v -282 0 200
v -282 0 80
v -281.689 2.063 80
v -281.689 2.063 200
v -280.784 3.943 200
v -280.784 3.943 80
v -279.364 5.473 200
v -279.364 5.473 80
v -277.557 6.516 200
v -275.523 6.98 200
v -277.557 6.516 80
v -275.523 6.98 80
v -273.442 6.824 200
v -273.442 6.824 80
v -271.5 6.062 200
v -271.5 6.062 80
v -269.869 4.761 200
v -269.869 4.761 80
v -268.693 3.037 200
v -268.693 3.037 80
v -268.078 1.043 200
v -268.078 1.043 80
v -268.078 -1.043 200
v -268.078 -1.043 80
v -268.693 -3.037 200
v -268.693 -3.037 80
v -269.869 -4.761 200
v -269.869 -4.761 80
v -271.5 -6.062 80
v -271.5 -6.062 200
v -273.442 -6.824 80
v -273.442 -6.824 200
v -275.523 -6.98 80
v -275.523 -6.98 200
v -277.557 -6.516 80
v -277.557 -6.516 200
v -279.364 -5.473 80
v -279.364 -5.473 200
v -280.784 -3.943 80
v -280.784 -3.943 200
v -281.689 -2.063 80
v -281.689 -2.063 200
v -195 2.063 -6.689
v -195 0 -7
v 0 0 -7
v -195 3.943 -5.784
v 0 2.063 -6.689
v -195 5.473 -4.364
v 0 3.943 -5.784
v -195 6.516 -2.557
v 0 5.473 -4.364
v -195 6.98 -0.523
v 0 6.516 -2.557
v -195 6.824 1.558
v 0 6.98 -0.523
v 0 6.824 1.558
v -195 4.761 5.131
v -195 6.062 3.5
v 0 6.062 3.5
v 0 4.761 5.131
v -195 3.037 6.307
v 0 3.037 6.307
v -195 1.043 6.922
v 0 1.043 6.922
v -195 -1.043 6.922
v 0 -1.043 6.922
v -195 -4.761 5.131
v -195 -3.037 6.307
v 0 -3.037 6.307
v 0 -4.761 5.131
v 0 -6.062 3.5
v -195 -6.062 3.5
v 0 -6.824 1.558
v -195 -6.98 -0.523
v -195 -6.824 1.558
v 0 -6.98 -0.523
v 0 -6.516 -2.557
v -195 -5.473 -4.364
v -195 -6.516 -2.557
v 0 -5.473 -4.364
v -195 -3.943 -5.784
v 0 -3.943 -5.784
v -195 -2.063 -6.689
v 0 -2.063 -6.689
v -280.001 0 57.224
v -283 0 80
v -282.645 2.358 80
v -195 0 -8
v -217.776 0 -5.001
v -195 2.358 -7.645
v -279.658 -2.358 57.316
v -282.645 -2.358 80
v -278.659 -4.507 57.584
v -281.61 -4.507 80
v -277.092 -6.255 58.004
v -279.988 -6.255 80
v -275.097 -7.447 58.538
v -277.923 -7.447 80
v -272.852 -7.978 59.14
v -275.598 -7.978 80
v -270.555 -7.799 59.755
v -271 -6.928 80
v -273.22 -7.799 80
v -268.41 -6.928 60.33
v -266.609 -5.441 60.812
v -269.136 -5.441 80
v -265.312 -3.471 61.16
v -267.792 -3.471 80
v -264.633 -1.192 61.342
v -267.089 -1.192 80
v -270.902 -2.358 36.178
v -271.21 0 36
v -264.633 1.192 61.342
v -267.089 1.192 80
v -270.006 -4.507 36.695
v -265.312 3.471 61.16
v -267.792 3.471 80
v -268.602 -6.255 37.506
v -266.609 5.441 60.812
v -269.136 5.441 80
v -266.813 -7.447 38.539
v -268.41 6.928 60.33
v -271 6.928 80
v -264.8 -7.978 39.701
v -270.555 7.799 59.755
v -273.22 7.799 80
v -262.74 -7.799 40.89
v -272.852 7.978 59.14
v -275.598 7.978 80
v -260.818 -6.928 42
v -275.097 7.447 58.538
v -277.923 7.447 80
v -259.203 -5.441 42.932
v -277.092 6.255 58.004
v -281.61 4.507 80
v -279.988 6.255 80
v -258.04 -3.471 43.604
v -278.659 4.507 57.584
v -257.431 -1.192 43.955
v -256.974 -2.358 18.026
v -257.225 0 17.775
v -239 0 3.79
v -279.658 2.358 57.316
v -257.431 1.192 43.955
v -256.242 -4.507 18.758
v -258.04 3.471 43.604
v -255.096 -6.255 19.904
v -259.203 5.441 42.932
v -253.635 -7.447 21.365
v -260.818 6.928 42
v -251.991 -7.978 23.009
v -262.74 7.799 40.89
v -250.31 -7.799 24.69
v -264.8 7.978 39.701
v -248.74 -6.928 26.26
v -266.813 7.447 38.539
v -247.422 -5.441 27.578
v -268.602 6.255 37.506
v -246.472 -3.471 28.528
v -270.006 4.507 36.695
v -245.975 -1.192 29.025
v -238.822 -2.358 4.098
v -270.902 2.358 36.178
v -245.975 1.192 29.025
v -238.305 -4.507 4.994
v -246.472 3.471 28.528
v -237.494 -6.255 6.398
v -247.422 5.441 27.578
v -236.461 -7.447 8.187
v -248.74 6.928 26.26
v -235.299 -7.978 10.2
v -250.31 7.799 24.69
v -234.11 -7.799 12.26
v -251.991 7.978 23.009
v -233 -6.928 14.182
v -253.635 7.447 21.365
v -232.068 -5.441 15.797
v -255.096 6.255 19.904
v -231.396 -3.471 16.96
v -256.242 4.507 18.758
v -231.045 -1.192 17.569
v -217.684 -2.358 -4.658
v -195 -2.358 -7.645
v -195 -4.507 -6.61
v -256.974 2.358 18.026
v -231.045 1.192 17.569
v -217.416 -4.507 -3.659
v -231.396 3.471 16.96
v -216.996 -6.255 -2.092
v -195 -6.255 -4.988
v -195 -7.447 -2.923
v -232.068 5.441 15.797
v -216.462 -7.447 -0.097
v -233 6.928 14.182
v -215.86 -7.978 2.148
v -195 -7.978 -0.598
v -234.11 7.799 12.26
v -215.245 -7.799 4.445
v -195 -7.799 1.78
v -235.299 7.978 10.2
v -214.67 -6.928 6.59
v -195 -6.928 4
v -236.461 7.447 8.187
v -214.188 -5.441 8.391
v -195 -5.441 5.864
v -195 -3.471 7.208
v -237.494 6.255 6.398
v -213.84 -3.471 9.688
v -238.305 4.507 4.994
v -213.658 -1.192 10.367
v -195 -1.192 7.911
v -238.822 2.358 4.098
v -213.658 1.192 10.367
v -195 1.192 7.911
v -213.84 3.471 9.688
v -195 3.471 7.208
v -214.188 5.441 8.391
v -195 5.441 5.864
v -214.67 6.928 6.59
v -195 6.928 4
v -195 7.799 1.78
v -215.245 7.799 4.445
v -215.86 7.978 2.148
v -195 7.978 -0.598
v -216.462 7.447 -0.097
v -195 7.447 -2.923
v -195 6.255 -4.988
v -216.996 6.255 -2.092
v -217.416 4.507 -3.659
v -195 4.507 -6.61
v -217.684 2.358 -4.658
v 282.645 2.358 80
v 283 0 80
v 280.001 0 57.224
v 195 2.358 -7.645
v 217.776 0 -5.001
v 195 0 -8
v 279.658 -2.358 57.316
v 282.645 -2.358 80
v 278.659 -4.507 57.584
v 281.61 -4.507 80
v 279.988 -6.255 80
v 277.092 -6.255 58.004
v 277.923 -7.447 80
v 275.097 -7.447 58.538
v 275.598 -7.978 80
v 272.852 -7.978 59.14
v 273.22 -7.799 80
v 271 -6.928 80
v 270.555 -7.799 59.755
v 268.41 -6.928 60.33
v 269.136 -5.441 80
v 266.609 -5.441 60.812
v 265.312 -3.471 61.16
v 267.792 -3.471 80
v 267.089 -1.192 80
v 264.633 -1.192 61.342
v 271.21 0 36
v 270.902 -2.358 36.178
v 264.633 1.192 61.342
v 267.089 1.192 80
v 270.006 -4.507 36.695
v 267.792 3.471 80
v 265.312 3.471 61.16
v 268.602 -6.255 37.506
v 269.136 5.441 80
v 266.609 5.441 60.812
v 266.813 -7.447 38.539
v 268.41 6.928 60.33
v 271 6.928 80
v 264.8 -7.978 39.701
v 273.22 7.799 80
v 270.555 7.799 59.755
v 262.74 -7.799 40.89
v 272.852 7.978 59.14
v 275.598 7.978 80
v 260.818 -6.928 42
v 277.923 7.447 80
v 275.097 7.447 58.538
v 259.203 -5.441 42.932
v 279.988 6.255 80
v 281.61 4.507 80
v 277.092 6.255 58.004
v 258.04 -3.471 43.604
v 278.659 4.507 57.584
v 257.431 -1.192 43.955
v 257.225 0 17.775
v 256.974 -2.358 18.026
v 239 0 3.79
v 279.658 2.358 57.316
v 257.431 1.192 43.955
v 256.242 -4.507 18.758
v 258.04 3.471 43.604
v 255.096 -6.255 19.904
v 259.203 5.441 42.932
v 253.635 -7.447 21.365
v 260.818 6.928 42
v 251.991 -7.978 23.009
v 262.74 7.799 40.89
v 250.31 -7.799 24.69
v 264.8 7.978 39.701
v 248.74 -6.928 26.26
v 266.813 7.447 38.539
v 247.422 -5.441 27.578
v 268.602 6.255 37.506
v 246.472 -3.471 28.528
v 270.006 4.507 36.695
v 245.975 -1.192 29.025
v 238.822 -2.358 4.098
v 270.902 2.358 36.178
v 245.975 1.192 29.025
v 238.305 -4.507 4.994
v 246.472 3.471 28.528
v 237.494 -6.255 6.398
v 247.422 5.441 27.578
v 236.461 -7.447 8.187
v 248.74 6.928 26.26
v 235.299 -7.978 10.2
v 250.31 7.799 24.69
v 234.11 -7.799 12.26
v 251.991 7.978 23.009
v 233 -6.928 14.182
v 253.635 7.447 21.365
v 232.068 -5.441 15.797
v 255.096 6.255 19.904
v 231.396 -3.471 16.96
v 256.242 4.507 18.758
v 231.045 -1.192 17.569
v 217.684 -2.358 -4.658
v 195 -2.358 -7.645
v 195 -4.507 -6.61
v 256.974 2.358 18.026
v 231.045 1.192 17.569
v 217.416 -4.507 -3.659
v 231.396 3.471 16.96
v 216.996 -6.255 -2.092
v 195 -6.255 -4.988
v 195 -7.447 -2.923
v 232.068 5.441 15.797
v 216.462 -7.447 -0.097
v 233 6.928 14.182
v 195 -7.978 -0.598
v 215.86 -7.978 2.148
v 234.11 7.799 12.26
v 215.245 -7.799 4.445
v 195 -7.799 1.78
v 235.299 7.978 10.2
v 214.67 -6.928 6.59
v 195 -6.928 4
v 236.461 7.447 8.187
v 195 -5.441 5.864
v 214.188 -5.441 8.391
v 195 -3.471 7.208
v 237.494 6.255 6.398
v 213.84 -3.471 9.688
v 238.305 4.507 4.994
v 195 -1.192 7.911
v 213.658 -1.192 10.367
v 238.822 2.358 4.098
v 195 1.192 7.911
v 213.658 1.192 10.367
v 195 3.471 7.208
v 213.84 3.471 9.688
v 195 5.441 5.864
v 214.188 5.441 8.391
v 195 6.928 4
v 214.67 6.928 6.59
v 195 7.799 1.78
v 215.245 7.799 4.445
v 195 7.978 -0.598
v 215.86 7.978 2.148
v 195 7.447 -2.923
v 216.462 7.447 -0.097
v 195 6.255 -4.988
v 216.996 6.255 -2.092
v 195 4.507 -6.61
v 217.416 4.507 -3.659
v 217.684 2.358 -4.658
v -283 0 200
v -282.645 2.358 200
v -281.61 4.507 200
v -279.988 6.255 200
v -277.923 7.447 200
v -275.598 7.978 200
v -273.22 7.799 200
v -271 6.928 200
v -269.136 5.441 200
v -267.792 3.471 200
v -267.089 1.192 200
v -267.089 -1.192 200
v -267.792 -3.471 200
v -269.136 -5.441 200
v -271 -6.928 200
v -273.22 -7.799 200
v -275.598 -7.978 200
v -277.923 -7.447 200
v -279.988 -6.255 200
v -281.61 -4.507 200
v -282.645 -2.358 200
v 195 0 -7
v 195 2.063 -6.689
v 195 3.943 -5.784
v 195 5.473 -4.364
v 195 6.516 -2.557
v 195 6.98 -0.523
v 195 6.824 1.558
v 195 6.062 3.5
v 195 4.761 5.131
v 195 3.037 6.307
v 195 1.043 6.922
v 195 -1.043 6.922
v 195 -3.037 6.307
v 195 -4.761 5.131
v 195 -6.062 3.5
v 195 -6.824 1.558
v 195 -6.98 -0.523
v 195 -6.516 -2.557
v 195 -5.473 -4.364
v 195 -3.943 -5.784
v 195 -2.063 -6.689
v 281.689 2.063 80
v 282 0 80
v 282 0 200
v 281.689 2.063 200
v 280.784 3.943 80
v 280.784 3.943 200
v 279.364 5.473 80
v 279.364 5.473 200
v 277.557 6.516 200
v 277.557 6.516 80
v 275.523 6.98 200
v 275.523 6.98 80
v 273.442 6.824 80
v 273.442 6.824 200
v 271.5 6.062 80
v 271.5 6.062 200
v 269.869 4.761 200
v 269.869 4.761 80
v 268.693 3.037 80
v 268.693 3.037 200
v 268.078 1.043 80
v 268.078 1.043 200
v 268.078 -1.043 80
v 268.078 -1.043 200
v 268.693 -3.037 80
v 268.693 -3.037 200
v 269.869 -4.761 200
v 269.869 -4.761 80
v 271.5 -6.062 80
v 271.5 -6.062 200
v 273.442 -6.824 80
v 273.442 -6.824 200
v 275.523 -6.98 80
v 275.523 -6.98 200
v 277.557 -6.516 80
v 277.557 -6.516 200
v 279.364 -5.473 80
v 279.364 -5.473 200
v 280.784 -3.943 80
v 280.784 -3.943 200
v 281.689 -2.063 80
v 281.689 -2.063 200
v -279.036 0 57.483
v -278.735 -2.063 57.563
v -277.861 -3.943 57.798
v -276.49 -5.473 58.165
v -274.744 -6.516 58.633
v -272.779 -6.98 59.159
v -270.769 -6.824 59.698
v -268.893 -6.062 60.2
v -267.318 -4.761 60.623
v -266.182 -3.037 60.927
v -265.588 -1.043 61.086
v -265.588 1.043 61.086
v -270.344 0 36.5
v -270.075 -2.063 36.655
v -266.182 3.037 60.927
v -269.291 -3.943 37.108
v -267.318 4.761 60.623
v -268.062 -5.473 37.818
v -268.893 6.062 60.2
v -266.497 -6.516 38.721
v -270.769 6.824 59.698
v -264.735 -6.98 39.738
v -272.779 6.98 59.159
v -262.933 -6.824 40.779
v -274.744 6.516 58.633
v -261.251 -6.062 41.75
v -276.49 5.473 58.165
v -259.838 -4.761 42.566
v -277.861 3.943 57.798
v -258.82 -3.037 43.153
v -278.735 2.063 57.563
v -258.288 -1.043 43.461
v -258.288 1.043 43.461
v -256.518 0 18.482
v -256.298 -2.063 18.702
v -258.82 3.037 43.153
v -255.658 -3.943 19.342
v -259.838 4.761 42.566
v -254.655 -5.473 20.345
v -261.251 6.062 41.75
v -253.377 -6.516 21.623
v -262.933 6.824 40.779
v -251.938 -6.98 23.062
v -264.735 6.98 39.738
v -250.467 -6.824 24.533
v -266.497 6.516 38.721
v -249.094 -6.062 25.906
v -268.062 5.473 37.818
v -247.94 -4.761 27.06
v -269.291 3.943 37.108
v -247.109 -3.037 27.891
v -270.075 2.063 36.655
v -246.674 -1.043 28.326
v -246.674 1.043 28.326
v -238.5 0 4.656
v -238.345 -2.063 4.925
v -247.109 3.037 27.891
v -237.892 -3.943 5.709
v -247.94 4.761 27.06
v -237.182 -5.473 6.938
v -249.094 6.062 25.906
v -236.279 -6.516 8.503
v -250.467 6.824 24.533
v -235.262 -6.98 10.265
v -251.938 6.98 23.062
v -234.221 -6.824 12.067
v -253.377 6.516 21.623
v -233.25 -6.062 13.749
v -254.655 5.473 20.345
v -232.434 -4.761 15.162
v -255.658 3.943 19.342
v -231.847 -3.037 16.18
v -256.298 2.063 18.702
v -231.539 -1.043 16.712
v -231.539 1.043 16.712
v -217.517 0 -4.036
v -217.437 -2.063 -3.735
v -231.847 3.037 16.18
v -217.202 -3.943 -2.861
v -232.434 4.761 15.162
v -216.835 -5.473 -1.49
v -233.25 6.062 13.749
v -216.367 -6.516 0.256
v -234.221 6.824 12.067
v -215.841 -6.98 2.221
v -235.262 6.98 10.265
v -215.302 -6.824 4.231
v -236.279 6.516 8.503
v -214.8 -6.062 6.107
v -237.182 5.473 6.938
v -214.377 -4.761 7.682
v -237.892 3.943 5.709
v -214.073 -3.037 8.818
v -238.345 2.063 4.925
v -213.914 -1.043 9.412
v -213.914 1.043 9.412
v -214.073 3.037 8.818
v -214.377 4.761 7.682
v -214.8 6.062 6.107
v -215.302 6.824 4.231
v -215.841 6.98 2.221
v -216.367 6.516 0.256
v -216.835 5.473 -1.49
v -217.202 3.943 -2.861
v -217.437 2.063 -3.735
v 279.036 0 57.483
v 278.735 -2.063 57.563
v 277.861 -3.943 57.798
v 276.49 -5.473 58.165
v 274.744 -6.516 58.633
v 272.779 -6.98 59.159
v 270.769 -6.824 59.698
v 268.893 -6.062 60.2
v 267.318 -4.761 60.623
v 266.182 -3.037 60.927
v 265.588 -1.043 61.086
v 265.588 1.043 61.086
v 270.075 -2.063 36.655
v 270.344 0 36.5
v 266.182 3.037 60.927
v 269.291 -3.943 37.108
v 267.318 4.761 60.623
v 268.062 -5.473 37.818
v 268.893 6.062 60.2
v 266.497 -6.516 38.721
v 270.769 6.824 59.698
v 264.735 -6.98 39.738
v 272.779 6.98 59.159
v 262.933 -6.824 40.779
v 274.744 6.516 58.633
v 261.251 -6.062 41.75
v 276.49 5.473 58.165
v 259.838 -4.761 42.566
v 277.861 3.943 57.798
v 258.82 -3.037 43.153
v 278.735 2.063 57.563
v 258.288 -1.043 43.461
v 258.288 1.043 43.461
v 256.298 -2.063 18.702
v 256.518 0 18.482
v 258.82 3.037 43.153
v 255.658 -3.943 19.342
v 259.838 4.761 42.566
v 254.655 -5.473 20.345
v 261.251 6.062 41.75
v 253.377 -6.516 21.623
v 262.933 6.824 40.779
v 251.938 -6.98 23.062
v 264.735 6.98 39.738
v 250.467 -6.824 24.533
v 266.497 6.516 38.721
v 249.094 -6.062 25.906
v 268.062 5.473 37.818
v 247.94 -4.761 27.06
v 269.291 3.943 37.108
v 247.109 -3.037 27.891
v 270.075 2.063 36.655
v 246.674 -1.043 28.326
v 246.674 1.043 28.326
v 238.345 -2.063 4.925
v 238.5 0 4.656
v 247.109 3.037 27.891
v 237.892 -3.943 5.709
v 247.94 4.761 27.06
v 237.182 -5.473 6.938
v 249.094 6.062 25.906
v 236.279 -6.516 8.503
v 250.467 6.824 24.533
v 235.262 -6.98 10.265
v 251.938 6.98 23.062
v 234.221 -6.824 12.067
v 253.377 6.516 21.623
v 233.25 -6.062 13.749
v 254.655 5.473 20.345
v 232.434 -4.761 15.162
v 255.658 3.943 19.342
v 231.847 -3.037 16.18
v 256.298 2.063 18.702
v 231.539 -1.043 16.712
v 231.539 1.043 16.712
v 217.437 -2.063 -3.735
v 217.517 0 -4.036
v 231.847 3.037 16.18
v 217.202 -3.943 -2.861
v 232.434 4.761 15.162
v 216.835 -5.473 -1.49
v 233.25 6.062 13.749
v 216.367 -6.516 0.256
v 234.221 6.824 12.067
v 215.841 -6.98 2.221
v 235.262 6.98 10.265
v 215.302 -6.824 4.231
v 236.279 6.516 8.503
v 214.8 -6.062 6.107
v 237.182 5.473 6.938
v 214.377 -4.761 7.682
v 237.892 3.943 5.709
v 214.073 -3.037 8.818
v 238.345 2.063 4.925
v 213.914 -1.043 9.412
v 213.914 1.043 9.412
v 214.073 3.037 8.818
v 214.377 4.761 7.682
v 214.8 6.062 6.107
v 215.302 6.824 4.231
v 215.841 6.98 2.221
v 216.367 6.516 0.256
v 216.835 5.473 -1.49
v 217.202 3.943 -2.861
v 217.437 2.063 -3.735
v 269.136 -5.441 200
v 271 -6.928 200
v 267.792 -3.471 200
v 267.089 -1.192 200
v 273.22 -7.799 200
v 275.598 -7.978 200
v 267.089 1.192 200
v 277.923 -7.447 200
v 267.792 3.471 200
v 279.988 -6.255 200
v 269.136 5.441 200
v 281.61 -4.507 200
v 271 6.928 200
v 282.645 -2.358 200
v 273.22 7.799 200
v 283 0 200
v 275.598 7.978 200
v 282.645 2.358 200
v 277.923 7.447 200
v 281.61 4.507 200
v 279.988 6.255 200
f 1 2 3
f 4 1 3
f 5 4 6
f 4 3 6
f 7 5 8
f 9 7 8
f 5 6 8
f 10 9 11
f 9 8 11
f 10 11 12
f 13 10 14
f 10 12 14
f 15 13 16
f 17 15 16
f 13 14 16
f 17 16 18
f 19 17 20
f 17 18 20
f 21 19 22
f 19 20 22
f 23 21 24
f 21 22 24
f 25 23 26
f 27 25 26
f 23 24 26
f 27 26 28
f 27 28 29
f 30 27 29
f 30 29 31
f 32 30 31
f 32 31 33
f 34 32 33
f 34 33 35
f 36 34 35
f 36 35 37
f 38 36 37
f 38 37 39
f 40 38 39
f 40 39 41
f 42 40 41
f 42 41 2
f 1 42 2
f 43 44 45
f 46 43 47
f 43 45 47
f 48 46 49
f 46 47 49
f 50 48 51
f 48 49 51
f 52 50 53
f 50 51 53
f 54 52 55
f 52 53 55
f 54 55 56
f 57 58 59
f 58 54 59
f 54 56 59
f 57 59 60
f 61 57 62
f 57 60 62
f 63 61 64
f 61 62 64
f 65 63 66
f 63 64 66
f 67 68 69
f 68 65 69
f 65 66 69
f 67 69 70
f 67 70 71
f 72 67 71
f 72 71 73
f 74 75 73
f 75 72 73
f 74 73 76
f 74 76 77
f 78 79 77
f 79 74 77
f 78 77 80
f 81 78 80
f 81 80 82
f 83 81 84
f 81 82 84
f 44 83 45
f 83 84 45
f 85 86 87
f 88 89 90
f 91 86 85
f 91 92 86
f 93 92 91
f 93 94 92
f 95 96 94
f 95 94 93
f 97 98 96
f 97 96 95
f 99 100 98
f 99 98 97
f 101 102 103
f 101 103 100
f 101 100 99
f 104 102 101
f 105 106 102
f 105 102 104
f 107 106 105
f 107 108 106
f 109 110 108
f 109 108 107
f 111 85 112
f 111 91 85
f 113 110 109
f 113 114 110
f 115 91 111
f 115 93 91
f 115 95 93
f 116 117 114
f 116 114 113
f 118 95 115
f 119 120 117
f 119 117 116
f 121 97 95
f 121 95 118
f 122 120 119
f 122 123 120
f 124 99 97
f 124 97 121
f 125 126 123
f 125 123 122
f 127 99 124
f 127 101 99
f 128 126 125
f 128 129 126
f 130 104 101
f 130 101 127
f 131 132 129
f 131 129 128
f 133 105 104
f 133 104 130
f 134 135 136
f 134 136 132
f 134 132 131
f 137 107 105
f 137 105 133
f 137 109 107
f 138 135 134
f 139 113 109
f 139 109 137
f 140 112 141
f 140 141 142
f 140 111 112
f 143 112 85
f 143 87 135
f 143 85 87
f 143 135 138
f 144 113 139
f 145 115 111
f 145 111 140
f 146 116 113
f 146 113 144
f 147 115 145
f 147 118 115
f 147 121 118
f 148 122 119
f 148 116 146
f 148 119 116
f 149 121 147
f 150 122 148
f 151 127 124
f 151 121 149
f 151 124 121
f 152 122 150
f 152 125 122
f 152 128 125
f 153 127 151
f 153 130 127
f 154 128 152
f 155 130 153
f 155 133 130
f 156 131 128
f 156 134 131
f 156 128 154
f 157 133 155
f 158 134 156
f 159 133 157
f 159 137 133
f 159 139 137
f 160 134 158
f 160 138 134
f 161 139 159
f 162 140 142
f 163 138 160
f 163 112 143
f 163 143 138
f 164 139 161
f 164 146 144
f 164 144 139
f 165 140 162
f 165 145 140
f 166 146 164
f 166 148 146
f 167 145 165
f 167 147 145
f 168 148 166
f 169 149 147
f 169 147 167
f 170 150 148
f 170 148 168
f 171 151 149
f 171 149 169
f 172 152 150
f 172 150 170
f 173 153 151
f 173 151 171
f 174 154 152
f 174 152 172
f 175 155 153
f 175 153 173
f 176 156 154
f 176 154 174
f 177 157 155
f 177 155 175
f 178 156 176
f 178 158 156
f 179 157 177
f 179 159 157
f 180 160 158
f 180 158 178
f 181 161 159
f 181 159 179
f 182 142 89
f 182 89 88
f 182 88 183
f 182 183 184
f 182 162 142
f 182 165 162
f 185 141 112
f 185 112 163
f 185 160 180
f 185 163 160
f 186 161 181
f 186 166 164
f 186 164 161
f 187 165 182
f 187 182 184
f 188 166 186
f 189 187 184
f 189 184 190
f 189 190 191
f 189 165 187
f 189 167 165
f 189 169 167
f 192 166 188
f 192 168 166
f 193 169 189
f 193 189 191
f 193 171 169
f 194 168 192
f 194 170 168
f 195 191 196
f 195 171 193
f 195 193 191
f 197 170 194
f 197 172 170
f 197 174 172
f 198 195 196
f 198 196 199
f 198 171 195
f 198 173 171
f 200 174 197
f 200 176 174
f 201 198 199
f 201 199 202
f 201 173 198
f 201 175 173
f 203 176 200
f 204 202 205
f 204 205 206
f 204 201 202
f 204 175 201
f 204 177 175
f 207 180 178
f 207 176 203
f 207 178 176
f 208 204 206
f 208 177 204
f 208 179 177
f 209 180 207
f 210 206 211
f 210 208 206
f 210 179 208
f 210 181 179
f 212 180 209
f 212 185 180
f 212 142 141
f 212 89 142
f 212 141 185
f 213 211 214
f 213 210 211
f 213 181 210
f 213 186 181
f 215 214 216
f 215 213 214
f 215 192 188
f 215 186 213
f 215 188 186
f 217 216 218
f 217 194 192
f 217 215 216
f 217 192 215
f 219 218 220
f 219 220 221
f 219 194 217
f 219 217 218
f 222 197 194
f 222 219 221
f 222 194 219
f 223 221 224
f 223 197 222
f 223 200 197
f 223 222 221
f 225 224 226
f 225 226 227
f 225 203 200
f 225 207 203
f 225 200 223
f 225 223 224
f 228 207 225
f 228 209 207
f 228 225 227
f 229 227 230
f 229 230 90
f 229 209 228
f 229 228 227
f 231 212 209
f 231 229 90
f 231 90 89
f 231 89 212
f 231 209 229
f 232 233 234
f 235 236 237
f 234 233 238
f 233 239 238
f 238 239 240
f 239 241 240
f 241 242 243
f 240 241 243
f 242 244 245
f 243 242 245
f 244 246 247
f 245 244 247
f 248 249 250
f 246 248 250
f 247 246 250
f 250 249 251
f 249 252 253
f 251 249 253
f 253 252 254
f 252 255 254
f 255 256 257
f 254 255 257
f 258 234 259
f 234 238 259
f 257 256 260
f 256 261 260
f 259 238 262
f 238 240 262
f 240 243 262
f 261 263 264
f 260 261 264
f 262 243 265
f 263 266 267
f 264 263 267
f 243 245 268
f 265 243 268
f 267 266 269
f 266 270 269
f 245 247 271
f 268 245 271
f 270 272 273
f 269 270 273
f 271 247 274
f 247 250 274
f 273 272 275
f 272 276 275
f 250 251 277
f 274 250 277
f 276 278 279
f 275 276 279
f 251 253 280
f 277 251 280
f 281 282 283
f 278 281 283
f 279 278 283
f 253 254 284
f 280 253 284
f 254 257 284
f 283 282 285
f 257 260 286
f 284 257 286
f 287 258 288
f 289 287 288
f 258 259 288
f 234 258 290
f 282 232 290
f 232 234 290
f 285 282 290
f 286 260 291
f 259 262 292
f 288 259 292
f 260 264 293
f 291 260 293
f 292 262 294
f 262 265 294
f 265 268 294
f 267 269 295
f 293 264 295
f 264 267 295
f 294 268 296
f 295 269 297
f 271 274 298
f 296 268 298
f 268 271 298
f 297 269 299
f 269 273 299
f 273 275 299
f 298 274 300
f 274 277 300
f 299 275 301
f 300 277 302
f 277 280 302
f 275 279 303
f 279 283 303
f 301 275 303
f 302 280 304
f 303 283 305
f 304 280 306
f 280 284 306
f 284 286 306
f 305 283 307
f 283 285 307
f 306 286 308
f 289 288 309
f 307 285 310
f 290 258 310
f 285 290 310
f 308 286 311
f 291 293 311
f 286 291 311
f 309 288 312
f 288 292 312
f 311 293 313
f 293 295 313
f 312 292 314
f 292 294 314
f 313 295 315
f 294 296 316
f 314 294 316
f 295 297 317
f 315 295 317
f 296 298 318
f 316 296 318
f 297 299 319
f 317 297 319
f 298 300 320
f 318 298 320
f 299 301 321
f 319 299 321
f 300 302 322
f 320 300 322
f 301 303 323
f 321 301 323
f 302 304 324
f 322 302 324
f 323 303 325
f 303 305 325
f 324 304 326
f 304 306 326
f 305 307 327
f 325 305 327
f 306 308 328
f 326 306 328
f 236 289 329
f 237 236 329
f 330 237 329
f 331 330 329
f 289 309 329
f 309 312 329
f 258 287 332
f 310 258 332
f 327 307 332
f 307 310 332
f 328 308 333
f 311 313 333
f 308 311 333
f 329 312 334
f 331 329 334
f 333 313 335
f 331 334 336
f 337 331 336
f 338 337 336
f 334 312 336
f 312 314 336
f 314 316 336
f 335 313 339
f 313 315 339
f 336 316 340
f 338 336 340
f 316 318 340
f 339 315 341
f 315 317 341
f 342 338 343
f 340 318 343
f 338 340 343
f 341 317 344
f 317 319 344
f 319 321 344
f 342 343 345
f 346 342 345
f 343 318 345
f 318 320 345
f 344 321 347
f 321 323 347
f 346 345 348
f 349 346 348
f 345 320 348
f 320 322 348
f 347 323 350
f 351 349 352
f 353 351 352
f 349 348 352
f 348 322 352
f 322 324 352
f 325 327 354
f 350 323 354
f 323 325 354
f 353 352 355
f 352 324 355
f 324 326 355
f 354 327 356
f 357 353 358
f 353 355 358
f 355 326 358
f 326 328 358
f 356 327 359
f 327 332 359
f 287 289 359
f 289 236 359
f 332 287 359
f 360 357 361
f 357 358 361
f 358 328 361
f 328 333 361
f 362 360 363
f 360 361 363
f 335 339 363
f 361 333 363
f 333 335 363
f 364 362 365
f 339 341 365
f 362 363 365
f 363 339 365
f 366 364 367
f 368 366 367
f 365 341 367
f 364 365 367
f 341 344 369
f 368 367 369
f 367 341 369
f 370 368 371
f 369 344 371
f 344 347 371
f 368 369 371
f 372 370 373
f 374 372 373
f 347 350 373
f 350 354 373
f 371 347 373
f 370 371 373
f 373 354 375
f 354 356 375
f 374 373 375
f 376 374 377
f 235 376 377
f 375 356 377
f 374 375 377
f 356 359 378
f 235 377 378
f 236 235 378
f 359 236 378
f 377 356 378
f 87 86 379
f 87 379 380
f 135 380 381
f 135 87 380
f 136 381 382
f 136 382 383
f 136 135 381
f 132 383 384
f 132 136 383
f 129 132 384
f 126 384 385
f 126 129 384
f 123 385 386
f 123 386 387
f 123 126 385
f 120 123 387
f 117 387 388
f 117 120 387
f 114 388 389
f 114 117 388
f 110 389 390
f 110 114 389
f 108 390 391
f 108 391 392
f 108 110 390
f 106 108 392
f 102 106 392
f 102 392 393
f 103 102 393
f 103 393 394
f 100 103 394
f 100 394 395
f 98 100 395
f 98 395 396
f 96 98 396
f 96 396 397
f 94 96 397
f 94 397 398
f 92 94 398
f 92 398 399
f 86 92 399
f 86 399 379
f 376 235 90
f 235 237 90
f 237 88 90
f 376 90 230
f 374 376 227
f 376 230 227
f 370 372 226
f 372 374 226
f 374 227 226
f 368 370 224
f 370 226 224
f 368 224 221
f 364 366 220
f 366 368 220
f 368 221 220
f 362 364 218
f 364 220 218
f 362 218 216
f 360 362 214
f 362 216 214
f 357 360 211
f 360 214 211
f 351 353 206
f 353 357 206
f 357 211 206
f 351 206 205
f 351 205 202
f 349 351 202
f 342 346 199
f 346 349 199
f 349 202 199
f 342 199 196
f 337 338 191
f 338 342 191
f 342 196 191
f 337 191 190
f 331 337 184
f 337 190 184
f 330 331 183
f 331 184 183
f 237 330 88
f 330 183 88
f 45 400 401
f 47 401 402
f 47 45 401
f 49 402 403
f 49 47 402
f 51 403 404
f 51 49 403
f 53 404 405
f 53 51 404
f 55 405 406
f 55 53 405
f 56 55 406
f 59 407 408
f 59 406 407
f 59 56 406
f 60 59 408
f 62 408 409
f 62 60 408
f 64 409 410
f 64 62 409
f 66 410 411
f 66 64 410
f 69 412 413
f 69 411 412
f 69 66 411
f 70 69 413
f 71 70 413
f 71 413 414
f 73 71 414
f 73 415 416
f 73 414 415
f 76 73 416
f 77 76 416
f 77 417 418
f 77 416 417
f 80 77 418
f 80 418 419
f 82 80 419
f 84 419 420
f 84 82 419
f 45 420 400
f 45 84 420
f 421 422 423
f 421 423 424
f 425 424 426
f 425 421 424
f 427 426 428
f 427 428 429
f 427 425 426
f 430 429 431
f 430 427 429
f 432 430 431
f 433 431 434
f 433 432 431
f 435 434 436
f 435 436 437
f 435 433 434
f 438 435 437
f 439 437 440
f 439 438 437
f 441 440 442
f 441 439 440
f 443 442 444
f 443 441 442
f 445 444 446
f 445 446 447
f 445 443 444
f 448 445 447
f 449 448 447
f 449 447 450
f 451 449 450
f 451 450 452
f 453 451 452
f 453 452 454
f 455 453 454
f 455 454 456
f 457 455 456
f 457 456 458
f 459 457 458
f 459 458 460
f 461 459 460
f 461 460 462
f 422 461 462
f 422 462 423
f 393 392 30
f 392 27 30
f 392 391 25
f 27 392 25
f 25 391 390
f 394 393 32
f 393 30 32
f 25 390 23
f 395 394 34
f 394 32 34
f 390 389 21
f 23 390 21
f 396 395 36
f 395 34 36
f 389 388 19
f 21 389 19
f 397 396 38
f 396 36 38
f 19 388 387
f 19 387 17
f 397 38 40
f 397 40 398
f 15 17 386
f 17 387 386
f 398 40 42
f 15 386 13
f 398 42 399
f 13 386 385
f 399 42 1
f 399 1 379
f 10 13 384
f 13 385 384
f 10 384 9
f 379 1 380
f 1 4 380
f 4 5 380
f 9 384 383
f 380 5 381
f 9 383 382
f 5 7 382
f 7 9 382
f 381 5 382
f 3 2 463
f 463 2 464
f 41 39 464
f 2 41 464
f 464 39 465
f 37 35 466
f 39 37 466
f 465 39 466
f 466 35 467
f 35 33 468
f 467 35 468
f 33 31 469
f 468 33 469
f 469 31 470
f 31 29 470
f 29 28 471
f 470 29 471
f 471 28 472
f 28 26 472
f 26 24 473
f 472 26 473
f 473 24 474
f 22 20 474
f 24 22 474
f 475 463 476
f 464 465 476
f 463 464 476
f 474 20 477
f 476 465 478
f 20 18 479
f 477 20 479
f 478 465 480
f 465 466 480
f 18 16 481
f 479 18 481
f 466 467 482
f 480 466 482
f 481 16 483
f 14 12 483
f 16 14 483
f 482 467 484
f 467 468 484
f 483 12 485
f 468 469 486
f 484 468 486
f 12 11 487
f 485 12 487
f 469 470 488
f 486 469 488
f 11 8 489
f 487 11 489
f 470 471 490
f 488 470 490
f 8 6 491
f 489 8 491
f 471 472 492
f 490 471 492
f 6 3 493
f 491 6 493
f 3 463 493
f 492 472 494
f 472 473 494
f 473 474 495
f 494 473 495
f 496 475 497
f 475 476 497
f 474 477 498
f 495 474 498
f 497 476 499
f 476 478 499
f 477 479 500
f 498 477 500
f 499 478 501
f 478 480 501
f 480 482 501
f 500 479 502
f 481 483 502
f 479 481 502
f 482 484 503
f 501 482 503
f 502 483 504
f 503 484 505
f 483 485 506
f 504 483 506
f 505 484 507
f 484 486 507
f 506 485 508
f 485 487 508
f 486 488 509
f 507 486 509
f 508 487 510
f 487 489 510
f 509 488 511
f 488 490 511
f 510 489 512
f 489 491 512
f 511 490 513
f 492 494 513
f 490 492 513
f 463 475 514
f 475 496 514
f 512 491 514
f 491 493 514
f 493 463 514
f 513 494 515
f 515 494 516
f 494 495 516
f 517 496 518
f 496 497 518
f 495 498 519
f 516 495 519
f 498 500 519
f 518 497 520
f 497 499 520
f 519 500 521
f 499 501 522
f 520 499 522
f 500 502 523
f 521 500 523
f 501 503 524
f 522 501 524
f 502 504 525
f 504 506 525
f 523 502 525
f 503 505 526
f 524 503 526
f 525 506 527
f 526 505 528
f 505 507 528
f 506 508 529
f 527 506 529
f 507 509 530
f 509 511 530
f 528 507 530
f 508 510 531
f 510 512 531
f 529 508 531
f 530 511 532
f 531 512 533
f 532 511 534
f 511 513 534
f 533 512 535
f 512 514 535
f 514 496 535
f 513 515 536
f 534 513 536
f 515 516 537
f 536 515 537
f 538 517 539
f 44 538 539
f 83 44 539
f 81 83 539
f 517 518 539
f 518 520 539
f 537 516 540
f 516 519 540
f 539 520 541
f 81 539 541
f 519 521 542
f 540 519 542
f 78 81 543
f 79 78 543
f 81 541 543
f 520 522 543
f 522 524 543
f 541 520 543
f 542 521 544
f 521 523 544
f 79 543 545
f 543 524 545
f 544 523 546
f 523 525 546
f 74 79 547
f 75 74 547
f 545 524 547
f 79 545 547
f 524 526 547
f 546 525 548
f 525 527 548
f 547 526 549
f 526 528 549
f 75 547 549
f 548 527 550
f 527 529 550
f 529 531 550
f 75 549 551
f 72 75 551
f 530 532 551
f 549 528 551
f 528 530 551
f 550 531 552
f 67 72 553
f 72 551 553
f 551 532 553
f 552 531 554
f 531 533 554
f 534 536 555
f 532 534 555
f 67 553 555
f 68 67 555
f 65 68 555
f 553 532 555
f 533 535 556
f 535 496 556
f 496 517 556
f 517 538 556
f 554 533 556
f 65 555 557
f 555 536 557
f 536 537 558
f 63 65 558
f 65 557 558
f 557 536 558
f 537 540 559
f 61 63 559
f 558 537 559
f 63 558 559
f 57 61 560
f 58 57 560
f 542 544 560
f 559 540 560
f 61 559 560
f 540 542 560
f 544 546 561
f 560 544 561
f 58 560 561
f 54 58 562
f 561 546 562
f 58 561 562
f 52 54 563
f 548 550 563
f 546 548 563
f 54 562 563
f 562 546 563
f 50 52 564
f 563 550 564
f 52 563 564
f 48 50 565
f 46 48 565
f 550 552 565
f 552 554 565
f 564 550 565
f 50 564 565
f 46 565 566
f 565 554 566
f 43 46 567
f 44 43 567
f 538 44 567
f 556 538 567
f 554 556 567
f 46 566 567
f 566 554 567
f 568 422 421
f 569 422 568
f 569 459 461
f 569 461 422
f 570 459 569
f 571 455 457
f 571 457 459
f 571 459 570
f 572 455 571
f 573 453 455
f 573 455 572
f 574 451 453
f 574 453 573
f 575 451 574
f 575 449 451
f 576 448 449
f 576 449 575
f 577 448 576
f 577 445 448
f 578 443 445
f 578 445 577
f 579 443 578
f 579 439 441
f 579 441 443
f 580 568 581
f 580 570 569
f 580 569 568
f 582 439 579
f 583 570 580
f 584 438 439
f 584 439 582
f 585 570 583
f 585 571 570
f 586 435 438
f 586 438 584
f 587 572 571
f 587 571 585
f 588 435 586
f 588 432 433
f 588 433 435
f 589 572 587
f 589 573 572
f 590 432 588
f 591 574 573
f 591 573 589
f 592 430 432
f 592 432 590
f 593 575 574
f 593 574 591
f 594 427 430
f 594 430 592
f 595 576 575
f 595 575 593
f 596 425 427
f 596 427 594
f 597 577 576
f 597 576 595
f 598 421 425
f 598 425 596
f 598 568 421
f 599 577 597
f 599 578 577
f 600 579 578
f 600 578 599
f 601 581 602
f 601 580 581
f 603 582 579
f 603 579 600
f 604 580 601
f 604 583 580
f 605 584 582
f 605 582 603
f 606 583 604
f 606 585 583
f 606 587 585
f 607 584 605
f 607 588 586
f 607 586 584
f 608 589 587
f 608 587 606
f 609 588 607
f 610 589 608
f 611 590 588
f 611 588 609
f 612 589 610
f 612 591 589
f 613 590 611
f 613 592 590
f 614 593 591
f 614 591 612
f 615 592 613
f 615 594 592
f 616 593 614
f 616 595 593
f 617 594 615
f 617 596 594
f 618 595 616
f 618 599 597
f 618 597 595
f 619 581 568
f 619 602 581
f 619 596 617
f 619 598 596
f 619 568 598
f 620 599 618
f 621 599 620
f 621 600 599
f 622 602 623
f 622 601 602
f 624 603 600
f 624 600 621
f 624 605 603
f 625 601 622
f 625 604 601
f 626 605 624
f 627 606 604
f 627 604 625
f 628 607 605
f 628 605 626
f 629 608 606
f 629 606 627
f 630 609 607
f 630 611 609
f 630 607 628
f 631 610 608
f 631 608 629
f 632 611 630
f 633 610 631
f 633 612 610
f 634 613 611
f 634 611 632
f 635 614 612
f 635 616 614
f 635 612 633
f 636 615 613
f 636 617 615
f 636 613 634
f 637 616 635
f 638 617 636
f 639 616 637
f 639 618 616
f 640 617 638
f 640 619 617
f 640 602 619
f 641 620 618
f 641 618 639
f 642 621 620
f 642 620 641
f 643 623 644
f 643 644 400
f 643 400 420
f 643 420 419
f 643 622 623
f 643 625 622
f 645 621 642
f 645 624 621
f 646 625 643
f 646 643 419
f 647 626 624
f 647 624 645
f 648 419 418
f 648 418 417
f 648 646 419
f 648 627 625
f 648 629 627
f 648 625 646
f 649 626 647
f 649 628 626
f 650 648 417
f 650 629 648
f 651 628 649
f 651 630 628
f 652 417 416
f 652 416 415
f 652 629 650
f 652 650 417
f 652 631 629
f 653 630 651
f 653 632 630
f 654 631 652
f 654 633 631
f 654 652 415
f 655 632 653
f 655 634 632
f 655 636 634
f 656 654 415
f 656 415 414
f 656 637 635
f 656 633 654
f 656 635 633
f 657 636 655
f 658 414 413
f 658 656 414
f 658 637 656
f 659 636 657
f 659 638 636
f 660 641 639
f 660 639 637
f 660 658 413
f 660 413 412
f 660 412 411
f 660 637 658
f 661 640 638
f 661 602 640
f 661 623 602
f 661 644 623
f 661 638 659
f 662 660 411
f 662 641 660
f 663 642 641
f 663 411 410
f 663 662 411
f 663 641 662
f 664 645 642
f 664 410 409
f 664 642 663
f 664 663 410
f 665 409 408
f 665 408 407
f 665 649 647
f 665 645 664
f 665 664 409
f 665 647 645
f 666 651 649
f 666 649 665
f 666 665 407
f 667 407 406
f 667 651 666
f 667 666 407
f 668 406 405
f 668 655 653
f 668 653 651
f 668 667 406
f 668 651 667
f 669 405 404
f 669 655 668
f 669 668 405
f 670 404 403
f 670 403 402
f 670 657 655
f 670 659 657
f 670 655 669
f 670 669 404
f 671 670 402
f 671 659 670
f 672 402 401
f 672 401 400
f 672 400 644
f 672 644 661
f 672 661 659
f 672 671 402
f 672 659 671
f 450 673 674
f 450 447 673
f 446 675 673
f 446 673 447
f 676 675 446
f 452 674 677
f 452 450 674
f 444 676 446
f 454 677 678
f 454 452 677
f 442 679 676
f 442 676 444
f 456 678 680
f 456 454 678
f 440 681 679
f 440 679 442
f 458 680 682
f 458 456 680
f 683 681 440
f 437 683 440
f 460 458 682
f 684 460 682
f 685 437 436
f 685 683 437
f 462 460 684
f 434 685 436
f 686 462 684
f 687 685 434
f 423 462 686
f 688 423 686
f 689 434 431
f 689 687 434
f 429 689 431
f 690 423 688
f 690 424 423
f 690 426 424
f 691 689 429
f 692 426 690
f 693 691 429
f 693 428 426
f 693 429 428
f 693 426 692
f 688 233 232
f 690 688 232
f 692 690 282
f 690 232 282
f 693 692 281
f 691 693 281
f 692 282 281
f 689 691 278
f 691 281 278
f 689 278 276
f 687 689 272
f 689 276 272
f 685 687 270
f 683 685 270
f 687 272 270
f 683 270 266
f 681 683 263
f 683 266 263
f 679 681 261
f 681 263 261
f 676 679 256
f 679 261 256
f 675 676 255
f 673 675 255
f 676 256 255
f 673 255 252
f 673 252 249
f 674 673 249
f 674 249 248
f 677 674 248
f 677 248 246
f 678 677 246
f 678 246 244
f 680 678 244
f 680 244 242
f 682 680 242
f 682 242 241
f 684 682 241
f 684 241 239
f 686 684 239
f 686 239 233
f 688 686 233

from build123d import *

# Parameters (mm, degrees)
SKETCH_2_R   = 8
SKETCH_2_R_2 = 7


with BuildPart() as part:
    # По траектории1: sweep along a path in Эскиз1
    with BuildLine(Plane(origin=(0, 0, 0), x_dir=(1, 0, 0), z_dir=(0, 1, 0))) as sweep_1_path:
        Line((-275, -200), (-275, -80))
        ThreePointArc((-275, -80), (-251.568542495, -23.431457505), (-195, 0))
        Line((-195, 0), (0, 0))
    # Эскиз2 → По траектории1 (sweep)
    with BuildSketch(Plane(origin=(0, 0, 0), x_dir=(0, 0, -1), z_dir=(1, 0, 0))):
        Circle(SKETCH_2_R)
        Circle(SKETCH_2_R_2, mode=Mode.SUBTRACT)
    sweep(path=sweep_1_path.line)

    # Зеркальное отражение1: part across plane


with BuildPart() as part_1:
    add(part.part)
    add(part.part.mirror(Plane(origin=(0, 0, 0), x_dir=(0, 0, 1), z_dir=(1, 0, 0))))


solid = part_1.part
